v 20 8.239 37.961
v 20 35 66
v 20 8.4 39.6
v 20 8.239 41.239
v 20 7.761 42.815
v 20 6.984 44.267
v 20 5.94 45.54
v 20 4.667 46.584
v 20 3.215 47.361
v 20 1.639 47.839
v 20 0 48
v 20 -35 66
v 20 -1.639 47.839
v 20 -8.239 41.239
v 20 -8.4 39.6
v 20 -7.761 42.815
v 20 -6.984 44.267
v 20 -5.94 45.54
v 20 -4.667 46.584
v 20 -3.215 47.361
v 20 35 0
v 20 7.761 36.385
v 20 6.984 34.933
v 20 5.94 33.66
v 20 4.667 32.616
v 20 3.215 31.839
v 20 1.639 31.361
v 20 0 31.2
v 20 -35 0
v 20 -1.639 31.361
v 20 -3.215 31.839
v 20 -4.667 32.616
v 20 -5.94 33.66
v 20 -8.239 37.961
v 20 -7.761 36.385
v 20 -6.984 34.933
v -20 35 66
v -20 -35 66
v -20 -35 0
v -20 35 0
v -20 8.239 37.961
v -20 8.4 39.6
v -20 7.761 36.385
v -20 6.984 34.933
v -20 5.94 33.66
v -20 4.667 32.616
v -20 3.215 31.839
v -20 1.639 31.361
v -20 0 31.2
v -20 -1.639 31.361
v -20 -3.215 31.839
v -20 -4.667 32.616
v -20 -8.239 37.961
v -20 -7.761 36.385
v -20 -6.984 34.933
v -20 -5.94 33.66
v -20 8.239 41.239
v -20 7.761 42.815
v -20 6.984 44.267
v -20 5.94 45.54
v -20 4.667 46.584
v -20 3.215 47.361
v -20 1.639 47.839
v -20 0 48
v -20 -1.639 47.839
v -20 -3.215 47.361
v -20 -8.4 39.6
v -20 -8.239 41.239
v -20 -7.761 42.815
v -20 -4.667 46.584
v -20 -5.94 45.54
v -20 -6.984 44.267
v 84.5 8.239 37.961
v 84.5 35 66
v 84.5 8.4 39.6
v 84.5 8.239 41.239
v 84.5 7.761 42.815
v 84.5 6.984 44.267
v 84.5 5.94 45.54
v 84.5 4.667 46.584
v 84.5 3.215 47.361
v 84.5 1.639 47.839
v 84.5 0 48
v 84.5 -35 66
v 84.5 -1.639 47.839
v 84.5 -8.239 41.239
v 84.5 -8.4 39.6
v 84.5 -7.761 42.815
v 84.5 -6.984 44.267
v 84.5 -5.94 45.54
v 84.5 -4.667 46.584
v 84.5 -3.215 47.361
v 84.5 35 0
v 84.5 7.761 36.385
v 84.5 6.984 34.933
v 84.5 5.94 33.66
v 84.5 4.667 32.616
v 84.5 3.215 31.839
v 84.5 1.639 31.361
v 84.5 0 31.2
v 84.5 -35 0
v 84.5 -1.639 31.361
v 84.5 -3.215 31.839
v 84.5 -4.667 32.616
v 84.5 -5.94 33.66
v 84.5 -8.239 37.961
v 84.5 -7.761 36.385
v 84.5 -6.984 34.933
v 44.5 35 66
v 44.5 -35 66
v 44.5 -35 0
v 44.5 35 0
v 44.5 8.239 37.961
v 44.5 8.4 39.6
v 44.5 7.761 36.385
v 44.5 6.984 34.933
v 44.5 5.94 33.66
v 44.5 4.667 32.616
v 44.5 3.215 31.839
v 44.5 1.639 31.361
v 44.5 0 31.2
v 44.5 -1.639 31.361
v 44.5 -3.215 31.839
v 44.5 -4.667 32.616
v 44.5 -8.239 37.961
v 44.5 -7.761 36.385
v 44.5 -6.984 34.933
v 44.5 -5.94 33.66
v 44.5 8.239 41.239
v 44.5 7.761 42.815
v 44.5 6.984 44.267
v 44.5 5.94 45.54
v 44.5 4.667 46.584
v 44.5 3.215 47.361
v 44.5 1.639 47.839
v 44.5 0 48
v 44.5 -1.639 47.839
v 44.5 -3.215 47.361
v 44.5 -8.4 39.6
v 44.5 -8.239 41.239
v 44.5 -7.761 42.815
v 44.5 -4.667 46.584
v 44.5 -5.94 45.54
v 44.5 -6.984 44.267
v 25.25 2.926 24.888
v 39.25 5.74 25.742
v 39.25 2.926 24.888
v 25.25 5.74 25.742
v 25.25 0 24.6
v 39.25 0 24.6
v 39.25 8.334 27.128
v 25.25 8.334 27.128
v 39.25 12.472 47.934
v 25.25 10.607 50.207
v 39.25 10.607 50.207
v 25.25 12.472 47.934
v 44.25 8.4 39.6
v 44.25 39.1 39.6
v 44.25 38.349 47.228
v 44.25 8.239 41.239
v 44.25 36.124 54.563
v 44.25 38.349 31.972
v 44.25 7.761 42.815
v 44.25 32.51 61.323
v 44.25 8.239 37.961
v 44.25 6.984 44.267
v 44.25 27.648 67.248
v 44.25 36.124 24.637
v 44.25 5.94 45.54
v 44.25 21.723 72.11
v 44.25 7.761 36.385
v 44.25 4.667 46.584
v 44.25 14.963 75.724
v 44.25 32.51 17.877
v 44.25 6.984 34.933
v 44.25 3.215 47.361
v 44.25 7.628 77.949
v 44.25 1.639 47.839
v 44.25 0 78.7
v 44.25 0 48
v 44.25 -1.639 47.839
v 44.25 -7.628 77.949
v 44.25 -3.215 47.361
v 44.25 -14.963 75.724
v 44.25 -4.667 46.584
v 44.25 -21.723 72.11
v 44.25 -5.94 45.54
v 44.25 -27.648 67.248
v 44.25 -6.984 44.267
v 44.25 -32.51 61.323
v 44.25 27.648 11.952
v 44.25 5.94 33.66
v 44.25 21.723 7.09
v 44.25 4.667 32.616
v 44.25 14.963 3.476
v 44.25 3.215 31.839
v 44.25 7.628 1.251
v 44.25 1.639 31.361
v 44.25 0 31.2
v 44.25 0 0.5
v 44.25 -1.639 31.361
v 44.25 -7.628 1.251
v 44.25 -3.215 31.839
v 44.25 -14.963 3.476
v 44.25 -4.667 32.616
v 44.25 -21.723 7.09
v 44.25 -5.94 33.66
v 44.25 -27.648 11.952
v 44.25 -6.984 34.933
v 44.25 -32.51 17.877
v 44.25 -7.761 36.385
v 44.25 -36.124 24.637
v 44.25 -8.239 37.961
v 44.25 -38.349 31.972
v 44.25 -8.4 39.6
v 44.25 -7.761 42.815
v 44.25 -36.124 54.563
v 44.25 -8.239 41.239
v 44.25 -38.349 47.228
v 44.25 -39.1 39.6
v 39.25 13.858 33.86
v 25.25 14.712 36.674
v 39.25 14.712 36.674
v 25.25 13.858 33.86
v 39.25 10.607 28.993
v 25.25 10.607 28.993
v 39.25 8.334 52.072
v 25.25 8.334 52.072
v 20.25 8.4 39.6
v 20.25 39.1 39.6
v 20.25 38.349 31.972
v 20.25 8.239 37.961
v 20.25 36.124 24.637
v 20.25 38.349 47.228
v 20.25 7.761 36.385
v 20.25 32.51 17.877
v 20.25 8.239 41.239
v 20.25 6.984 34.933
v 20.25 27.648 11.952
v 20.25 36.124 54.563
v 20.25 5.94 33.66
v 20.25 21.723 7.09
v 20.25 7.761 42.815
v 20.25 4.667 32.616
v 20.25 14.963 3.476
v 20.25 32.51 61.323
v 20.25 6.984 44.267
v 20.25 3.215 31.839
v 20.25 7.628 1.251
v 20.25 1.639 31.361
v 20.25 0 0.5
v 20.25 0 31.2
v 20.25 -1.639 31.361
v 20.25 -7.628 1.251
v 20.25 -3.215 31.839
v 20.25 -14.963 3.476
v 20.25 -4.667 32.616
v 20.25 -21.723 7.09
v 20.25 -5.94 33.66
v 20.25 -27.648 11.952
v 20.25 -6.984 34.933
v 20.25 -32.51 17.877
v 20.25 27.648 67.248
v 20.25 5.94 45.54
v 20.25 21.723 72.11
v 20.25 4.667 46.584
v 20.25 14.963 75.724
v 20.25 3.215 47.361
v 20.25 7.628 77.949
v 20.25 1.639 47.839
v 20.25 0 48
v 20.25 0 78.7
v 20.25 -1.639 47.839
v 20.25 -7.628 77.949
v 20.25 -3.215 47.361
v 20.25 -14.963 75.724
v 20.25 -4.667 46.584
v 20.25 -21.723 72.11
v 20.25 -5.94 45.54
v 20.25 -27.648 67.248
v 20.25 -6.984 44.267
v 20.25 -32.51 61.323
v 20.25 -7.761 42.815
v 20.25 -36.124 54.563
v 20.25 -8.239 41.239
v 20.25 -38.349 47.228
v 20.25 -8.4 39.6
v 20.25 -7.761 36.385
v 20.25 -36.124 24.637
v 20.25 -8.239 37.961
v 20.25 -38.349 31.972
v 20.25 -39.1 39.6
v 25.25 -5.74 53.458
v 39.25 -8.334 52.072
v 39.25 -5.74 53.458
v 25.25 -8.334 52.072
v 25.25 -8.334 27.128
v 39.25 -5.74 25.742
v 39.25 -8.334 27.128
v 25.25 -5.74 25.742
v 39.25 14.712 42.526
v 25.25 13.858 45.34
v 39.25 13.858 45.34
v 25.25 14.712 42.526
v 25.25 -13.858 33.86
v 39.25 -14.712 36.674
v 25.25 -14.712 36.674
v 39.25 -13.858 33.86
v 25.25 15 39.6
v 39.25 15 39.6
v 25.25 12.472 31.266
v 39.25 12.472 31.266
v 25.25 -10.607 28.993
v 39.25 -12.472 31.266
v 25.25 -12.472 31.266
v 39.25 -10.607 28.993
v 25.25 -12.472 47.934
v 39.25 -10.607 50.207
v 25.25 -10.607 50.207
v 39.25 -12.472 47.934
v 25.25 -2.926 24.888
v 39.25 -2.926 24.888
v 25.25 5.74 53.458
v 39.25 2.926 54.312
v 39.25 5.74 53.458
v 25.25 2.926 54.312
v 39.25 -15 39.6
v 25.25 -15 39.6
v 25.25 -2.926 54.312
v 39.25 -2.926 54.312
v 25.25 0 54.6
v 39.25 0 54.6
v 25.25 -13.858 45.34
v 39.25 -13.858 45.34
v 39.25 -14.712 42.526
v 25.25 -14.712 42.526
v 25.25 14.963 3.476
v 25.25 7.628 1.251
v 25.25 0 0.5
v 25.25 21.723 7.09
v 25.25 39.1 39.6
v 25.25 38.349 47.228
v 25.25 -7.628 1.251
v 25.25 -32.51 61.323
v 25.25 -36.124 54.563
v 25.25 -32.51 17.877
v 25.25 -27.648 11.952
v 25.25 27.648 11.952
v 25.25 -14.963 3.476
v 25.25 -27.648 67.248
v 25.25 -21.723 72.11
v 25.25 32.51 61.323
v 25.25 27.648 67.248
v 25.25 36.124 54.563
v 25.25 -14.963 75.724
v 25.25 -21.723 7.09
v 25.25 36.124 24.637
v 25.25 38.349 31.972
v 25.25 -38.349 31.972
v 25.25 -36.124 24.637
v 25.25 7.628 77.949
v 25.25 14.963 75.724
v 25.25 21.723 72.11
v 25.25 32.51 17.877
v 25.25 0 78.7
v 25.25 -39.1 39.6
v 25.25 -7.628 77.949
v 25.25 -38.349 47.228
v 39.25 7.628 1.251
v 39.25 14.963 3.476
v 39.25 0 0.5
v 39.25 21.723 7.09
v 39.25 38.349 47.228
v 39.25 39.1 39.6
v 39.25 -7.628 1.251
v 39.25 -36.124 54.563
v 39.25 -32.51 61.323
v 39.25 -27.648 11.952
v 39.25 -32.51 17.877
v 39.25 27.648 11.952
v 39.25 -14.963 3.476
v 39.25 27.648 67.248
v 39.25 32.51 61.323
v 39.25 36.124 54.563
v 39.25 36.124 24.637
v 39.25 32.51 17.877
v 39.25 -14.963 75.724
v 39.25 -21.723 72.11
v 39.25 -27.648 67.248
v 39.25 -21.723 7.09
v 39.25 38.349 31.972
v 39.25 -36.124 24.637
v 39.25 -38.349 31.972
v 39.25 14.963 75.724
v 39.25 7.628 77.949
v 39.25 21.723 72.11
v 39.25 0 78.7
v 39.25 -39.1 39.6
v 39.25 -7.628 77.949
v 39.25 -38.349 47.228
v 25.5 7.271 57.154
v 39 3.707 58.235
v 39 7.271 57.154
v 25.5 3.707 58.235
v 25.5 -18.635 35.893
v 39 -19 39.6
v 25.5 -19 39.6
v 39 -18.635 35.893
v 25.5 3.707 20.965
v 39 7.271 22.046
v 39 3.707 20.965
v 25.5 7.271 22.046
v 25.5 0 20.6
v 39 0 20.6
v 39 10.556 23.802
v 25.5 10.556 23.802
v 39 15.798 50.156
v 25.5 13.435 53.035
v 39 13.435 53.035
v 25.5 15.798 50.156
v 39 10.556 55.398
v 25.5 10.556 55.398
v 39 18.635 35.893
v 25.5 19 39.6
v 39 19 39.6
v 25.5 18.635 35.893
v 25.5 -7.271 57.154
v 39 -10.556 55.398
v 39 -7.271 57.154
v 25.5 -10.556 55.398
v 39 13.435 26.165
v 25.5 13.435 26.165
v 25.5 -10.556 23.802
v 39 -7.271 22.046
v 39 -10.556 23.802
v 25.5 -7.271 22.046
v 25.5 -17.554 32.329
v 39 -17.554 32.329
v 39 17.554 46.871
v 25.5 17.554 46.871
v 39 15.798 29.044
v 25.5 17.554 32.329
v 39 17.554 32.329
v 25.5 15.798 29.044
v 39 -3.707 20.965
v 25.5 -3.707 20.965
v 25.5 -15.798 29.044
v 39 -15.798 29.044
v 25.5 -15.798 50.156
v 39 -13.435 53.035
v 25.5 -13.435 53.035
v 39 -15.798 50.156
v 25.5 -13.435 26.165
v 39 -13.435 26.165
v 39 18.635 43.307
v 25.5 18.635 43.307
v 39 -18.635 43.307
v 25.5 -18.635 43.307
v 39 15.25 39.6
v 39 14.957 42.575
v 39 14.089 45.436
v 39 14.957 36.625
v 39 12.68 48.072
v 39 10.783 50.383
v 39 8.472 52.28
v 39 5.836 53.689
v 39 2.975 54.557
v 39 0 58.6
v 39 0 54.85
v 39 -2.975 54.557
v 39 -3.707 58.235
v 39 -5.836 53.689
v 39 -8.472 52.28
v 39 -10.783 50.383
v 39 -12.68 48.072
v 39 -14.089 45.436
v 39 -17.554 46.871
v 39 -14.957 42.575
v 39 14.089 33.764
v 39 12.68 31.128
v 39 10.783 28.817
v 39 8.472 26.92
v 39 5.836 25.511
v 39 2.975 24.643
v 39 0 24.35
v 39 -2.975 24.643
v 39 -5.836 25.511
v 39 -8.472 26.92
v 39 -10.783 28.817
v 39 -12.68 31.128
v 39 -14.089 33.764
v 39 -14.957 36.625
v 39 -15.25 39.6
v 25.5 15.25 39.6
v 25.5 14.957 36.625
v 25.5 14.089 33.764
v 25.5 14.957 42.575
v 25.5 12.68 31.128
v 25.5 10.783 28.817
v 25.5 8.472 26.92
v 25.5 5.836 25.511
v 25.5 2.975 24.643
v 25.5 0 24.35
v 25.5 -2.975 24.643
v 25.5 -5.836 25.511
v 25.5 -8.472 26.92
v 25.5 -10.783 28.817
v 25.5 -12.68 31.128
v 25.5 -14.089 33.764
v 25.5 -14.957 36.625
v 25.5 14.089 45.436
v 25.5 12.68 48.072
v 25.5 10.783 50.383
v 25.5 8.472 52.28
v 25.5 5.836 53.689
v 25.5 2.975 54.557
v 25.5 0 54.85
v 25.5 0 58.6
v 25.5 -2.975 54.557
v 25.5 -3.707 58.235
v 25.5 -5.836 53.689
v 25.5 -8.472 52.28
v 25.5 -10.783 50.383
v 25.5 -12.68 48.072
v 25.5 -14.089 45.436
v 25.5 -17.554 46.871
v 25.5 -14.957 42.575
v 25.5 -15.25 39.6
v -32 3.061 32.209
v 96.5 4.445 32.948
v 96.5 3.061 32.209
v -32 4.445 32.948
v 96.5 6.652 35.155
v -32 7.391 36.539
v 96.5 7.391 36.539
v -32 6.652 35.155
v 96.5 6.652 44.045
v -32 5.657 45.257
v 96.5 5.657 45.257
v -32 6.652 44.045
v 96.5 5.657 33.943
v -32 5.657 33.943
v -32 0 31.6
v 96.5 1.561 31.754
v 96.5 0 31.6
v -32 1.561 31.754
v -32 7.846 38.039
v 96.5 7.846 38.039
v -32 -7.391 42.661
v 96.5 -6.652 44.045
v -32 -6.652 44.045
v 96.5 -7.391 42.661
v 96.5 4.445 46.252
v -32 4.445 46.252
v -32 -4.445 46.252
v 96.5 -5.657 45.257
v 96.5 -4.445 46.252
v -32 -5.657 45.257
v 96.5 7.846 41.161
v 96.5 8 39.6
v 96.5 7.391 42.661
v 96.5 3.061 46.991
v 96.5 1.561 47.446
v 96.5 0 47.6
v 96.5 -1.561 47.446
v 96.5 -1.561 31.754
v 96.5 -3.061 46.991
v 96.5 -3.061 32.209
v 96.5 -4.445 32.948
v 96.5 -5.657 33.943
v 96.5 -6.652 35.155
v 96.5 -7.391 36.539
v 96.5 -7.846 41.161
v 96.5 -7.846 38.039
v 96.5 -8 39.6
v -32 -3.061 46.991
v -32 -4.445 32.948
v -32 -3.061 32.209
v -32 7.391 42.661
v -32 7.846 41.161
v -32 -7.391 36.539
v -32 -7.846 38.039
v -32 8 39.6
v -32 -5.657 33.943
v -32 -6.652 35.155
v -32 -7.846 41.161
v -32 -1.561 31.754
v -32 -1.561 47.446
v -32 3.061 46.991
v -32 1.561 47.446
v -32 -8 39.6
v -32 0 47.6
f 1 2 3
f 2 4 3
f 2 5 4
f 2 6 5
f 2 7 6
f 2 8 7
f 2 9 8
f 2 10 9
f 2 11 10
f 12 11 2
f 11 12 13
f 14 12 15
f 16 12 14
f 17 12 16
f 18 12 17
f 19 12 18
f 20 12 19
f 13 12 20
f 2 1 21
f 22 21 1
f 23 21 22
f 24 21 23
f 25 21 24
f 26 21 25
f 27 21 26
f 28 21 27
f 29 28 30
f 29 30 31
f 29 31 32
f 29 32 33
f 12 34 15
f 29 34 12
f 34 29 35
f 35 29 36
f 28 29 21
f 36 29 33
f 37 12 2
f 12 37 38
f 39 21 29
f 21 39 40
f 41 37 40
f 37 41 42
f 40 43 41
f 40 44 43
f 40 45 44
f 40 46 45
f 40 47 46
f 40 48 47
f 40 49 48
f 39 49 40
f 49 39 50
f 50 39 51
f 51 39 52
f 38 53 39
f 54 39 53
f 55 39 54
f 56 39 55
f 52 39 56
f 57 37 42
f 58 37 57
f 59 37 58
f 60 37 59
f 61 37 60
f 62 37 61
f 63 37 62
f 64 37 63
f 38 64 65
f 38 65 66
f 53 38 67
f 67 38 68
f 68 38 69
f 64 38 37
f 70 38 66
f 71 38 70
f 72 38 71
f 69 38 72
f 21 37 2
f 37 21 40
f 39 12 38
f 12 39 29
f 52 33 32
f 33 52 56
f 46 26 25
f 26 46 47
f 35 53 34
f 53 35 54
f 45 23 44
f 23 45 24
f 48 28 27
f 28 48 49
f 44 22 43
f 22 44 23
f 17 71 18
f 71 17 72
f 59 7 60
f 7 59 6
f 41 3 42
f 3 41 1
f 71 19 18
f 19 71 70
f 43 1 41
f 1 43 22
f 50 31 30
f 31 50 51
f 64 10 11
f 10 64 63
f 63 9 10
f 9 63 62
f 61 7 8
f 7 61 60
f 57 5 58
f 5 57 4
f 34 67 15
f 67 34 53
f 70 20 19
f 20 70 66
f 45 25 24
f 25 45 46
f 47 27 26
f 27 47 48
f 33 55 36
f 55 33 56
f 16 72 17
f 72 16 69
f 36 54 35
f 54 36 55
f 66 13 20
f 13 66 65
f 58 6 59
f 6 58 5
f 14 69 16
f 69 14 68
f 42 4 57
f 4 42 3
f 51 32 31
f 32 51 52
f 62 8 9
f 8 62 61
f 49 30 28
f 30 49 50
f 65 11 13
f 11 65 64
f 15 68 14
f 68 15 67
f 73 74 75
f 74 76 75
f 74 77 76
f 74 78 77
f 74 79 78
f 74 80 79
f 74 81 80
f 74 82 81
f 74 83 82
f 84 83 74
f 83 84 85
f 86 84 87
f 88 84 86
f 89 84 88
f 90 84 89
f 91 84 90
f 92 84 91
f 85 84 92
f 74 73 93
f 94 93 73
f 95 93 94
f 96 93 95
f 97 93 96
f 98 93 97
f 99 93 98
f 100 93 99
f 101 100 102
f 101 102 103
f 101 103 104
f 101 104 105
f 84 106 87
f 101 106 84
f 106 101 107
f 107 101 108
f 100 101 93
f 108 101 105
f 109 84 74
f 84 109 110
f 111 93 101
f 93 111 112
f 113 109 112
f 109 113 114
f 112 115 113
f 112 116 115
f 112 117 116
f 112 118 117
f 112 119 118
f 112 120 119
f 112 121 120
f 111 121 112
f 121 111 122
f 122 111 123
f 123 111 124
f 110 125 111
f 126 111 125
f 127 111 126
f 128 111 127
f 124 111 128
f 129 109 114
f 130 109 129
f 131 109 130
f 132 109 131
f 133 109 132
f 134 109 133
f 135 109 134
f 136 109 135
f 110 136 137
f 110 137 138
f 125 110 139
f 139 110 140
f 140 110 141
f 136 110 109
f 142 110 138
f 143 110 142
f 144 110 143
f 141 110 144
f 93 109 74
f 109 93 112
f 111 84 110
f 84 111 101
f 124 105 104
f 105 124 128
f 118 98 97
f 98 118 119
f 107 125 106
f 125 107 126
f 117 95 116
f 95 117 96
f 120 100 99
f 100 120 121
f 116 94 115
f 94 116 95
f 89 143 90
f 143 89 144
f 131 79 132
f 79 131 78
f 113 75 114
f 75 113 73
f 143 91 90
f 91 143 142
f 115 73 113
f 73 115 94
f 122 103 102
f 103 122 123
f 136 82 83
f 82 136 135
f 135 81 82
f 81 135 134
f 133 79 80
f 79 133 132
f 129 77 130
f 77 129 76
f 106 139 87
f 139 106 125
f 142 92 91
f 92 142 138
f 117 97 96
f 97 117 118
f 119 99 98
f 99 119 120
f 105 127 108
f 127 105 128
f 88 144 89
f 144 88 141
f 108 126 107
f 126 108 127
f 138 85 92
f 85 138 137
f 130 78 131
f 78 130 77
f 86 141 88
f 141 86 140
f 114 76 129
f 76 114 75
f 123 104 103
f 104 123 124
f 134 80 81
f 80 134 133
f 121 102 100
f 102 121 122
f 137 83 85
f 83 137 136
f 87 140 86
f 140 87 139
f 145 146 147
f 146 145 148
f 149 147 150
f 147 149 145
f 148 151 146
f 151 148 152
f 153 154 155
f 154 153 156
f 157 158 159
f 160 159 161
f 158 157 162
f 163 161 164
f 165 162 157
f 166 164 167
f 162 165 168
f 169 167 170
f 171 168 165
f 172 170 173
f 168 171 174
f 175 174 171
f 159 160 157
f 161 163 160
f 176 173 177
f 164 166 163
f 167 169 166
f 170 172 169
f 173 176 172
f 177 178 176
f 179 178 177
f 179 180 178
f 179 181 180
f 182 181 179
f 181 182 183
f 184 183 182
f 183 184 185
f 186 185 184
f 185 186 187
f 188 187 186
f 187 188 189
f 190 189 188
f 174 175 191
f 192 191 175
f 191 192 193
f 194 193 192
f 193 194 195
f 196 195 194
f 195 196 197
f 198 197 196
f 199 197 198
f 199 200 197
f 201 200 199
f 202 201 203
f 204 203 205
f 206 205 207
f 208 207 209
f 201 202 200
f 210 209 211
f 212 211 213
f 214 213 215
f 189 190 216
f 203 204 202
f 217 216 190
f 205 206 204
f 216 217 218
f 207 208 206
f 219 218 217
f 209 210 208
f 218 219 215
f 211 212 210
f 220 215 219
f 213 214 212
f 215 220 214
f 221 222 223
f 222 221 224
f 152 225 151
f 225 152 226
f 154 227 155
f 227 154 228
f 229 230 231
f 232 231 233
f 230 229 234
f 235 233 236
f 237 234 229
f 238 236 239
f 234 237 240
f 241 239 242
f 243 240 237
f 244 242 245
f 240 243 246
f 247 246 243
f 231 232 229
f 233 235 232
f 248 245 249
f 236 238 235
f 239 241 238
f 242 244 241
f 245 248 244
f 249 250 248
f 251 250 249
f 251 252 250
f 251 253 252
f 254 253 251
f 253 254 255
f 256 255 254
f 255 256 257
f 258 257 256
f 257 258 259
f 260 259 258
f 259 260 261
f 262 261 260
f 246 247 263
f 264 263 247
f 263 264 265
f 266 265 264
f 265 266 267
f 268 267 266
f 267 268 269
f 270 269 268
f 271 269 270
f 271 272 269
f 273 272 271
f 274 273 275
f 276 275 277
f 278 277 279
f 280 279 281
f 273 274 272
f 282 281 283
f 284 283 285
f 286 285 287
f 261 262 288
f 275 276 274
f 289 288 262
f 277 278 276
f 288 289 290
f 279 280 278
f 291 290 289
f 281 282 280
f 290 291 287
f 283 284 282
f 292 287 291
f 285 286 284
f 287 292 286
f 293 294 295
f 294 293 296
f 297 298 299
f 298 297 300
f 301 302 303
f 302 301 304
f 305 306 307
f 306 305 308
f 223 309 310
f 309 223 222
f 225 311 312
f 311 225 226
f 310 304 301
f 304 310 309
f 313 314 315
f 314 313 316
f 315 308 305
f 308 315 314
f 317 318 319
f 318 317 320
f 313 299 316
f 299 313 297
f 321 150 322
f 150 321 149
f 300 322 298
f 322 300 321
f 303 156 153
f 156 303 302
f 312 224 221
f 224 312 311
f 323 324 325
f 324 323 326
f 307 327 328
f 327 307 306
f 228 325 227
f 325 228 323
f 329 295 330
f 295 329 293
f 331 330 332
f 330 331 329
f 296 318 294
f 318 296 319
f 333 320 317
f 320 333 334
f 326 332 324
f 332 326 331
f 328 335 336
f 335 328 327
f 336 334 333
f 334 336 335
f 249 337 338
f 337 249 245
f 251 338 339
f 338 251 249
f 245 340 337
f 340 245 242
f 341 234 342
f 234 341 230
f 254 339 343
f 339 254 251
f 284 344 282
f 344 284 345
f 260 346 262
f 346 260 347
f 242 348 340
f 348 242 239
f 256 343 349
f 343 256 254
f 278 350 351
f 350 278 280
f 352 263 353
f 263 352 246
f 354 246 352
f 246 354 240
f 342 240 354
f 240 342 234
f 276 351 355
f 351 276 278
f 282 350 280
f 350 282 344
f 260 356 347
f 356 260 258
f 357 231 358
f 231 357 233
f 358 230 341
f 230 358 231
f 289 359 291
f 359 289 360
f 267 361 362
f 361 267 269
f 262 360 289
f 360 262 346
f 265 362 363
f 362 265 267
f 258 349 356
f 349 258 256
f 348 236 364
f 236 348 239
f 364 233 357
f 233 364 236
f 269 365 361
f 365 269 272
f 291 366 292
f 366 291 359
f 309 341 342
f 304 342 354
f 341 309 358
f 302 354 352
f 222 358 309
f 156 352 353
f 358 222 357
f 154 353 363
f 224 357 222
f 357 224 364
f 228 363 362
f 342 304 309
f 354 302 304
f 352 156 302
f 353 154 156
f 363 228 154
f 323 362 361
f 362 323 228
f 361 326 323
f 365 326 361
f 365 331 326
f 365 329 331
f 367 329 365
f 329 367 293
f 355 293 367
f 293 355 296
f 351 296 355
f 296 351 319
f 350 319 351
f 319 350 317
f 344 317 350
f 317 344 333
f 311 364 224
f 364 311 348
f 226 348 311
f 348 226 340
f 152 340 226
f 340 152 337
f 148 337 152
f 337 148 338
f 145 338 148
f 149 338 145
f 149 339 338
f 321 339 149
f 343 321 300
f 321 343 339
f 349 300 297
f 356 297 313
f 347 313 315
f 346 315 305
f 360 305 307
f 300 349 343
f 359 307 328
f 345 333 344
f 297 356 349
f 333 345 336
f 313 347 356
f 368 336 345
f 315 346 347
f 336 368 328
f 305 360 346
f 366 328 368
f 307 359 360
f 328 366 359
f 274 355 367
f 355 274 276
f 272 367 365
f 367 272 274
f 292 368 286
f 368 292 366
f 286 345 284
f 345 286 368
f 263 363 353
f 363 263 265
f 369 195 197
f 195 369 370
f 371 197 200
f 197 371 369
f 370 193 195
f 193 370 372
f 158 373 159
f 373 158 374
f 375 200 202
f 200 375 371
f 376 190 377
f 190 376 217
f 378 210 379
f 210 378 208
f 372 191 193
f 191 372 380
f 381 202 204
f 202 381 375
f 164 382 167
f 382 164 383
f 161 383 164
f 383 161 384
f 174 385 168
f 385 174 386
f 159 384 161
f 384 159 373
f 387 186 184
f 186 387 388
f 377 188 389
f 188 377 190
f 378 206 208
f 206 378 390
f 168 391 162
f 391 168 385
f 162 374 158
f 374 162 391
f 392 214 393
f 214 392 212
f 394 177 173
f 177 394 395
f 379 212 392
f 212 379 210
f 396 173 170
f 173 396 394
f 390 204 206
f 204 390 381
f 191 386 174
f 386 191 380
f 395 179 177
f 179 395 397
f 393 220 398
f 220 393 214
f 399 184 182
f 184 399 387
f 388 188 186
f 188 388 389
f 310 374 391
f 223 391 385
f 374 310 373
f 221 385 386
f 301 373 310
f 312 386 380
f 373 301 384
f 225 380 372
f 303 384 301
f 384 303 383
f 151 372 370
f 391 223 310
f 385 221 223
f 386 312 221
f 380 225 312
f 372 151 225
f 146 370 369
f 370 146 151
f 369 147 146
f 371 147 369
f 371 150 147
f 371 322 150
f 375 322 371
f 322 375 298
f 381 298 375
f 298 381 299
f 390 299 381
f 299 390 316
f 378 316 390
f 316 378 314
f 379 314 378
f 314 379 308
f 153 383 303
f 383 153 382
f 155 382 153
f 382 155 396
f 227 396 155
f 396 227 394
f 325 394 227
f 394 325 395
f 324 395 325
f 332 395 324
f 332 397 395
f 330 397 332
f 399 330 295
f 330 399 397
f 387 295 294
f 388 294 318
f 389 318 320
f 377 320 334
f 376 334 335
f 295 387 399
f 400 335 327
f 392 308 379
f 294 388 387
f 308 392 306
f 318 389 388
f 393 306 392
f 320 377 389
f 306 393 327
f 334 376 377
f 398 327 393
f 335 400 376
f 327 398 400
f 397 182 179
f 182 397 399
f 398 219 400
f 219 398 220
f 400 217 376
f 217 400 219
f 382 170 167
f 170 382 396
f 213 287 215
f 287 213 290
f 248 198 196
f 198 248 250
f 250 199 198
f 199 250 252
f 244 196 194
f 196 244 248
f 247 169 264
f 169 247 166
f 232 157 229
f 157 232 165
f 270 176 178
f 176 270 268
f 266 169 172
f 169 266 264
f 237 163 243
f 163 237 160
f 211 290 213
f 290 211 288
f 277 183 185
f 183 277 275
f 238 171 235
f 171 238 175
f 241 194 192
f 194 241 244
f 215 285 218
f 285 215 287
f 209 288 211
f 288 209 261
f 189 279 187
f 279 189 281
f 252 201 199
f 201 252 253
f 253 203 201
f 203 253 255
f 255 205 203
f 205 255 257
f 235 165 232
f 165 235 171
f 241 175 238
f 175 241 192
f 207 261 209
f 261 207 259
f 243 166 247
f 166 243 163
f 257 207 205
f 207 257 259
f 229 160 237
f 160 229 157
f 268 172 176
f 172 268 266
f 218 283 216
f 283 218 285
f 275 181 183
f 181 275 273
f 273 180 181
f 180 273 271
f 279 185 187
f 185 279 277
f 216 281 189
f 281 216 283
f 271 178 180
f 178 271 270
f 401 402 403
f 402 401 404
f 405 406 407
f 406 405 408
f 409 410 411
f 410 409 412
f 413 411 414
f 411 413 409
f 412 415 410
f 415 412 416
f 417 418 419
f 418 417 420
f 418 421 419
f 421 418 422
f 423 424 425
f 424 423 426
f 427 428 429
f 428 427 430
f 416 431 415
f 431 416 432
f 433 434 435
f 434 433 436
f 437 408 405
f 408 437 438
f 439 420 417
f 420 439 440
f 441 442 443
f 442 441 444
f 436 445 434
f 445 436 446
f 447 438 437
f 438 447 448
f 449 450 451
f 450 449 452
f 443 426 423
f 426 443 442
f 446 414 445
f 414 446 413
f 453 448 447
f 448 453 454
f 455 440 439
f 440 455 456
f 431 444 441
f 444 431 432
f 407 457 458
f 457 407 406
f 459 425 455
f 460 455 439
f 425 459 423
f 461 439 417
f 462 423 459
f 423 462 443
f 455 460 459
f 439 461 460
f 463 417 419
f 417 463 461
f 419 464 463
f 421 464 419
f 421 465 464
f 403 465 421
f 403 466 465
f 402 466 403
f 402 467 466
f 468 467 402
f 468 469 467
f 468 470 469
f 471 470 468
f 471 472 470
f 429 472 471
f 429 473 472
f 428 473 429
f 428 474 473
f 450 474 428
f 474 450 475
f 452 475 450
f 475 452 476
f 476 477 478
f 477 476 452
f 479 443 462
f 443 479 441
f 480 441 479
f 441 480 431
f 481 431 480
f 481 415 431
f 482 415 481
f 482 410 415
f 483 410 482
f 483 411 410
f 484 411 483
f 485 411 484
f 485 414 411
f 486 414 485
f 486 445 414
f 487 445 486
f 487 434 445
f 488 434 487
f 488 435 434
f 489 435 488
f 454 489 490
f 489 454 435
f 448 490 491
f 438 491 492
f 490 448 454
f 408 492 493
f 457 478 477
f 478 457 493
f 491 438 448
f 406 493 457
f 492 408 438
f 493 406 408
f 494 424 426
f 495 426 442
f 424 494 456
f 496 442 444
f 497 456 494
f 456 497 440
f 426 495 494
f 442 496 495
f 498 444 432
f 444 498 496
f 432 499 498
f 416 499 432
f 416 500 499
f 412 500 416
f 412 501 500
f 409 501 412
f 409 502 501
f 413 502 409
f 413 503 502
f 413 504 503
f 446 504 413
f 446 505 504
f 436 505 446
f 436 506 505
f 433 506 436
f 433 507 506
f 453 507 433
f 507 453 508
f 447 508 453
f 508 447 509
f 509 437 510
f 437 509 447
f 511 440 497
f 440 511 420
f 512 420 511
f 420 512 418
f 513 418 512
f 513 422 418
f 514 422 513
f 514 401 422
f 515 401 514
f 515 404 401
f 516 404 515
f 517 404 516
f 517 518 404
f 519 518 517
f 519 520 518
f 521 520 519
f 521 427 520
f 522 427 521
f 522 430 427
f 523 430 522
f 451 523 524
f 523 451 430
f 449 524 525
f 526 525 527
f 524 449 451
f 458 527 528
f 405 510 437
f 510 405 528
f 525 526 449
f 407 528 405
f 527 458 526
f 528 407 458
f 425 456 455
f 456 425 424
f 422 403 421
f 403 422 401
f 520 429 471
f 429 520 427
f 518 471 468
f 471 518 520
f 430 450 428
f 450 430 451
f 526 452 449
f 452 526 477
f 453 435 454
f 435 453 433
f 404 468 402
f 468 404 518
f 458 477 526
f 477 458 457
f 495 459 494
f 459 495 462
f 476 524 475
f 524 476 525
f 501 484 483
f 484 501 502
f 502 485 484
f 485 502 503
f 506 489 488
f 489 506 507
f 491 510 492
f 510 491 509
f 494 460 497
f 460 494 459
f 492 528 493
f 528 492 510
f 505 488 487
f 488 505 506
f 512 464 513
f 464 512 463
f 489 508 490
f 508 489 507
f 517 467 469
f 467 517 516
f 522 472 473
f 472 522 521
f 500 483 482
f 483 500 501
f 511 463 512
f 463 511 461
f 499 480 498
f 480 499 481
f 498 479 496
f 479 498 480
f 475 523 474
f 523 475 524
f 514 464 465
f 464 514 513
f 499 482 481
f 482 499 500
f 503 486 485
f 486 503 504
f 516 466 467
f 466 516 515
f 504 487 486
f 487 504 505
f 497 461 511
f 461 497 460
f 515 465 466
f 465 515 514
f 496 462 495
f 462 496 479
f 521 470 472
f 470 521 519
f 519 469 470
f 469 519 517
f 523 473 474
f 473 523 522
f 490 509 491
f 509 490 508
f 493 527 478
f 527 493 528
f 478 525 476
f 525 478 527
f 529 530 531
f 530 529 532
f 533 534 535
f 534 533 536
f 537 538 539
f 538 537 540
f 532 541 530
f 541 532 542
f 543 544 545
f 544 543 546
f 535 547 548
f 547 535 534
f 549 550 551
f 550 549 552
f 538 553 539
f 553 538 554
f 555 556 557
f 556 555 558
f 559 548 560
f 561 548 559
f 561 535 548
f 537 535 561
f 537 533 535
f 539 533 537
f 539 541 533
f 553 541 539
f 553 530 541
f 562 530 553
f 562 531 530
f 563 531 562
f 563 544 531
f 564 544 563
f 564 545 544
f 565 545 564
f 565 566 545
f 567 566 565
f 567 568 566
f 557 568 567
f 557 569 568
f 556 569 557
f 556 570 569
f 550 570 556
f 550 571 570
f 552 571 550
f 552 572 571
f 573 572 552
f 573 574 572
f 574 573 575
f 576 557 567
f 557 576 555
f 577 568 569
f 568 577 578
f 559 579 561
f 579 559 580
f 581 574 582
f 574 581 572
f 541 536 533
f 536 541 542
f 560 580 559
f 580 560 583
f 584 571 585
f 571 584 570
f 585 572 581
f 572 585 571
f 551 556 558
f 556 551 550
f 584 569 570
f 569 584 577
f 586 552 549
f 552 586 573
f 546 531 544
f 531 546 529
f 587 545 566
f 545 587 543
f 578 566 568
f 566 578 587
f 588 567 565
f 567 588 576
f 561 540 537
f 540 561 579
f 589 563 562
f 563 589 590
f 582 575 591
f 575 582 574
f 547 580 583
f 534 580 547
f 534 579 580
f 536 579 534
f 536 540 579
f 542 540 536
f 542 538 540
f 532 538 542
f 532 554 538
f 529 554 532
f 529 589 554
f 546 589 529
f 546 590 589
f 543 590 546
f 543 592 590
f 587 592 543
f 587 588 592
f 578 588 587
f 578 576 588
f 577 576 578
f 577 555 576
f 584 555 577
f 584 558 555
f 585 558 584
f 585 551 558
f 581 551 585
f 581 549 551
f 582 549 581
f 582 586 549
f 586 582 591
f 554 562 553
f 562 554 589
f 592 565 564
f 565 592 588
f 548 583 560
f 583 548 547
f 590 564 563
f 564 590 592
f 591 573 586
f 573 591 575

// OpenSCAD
$fn = 32;

// ------------------------------------------------------------------------
// Pulley assembly: d78.2 pulley with a belt, shaft d16
// Every part is its own module, assembly() places them once.
// ------------------------------------------------------------------------

// --- part 1 ---
module support1() {
  difference() {
    translate([-20, -35, 0]) cube([40, 70, 66]);
    translate([0, 0, 39.6]) rotate([0, 90, 0]) cylinder(h = 42, d = 16.8, center = true);
  }
}

// --- part 2 ---
module support2() {
  difference() {
    translate([-20, -35, 0]) cube([40, 70, 66]);
    translate([0, 0, 39.6]) rotate([0, 90, 0]) cylinder(h = 42, d = 16.8, center = true);
  }
}

// --- part 3 ---
module shaft() {
  translate([0, 0, -64.25]) cylinder(h = 128.5, d = 16);
}

// --- part 4 ---
module pulley() {
  difference() {
    union() {
      cylinder(h = 24, d = 30);
      cylinder(h = 5, d = 78.2);
      translate([0, 0, 19]) cylinder(h = 5, d = 78.2);
    }
    translate([0, 0, -1]) cylinder(h = 26, d = 16.8);
  }
}

// --- part 5 ---
module belt() {
  difference() {
      translate([0, 0, 0]) cylinder(h = 13.5, d = 38);
      translate([0, 0, -1]) cylinder(h = 15.5, d = 30.5);
    }
}

// --- assembly ---
module assembly() {
  translate([0, 0, 0]) rotate([0, 0, 0]) support1();
  translate([64.5, 0, 0]) rotate([0, 0, 0]) support2();
  translate([32.25, 0, 39.6]) rotate([0, 90, 0]) shaft();
  translate([20.25, 0, 39.6]) rotate([0, 90, 0]) pulley();
  translate([25.5, 0, 39.6]) rotate([0, 90, 0]) belt();
}

assembly();
